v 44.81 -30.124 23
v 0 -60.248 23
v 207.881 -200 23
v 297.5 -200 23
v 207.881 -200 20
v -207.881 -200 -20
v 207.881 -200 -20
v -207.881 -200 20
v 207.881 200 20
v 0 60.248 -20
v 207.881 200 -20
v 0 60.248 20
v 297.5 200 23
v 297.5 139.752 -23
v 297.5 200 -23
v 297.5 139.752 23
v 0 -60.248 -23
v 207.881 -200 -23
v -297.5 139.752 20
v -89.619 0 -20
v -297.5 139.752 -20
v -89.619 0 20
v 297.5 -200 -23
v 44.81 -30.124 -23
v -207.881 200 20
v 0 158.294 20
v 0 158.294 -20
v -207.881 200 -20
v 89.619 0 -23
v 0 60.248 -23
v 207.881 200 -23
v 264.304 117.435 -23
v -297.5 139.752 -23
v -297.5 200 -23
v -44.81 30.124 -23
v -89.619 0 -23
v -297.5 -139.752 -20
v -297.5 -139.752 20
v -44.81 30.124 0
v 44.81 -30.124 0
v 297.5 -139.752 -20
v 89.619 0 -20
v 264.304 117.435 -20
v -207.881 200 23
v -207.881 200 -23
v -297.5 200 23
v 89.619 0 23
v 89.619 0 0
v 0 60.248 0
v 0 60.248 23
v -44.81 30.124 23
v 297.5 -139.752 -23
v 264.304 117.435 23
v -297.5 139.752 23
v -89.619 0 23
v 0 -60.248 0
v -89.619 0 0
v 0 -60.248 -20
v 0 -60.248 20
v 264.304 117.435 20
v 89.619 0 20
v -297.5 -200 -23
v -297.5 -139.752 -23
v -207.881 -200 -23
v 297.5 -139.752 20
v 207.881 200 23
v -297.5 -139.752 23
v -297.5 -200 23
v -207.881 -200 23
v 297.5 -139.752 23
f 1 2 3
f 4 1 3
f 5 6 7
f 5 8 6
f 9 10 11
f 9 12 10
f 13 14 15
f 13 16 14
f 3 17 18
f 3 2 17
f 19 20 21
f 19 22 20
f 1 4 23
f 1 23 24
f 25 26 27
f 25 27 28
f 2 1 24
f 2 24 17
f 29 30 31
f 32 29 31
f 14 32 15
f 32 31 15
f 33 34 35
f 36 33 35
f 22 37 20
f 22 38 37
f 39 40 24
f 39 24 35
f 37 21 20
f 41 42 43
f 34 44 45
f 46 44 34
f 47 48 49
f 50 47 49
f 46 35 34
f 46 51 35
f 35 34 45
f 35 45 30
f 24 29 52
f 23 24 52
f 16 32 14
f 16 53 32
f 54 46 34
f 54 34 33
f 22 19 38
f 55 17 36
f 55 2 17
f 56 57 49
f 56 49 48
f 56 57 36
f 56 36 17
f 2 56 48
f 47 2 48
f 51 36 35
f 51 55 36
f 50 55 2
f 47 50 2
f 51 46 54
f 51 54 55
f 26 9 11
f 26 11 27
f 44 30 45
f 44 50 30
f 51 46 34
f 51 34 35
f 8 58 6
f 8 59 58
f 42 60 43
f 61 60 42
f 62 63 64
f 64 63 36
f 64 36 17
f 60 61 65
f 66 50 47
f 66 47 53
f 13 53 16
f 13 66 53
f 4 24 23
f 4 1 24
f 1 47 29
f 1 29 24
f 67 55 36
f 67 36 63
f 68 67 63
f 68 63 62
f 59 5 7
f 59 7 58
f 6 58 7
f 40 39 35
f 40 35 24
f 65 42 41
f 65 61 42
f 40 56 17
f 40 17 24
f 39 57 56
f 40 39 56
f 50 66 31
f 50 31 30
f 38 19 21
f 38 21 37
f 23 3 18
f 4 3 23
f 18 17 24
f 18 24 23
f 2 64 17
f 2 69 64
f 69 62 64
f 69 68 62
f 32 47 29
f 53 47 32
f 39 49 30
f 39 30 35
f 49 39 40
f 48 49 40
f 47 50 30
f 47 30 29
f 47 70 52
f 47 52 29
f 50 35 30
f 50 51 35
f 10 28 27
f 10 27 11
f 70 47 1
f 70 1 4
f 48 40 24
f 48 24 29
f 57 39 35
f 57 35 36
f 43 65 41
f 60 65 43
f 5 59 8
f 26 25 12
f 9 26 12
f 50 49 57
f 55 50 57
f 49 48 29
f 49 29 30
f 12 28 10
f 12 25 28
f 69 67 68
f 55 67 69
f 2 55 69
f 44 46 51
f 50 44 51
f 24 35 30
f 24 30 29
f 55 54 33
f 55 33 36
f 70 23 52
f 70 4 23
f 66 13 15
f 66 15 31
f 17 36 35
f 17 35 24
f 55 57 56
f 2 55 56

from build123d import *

# Parameters (mm, degrees)
F1_DEPTH = 23
F2_DEPTH = 23
F3_DEPTH = 23
F4_DEPTH = 23
F5_DEPTH = 23
F6_DEPTH = 23
F7_DEPTH = 20


with BuildPart() as f1:
    # F0 (on Top) → F1 (new body, symmetric)
    with BuildSketch(Plane.XY):
        Polygon((207.8805789742, -200), (297.5, -200), (44.8097105129, -30.1241751347), (0, -60.2483502694), align=None)
    extrude(amount=F1_DEPTH, both=True)


with BuildPart() as f1b:
    # F0 (on Top) → F1, piece 2 (new body, symmetric)
    with BuildSketch(Plane.XY):
        Polygon((-44.8097105129, 30.1241751347), (-297.5, 200), (-297.5, 139.7516497306), (-89.6194210258, 0), align=None)
    extrude(amount=F1_DEPTH, both=True)


with BuildPart() as f2:
    # F0 (on Top) → F2 (new body)
    with BuildSketch(Plane.XY):
        Polygon((44.8097105129, -30.1241751347), (0, 0), (-44.8097105129, -30.1241751347), (0, -60.2483502694), align=None)
        Polygon((-44.8097105129, -30.1241751347), (0, 0), (-44.8097105129, 30.1241751347), (-89.6194210258, 0), align=None)
    extrude(amount=-F2_DEPTH)


with BuildPart() as f3:
    # F0 (on Top) → F3 (new body, symmetric)
    with BuildSketch(Plane.XY):
        Polygon((0, 60.2483502694), (-207.8805789742, 200), (-297.5, 200), (-44.8097105129, 30.1241751347), align=None)
    extrude(amount=F3_DEPTH, both=True)


with BuildPart() as f3b:
    # F0 (on Top) → F3, piece 2 (new body, symmetric)
    with BuildSketch(Plane.XY):
        Polygon((297.5, -200), (297.5, -139.7516497306), (89.6194210258, 0), (44.8097105129, -30.1241751347), align=None)
    extrude(amount=F3_DEPTH, both=True)


with BuildPart() as f4:
    # F0 (on Top) → F4 (new body)
    with BuildSketch(Plane.XY):
        Polygon((89.6194210258, 0), (44.8097105129, 30.1241751347), (0, 0), (44.8097105129, -30.1241751347), align=None)
        Polygon((0, 0), (44.8097105129, 30.1241751347), (0, 60.2483502694), (-44.8097105129, 30.1241751347), align=None)
    extrude(amount=-F4_DEPTH)


with BuildPart() as f5:
    # F0 (on Top) → F5 (new body, symmetric)
    with BuildSketch(Plane.XY):
        Polygon((0, -60.2483502694), (-44.8097105129, -30.1241751347), (-297.5, -200), (-207.8805789742, -200), align=None)
        Polygon((-297.5, -200), (-44.8097105129, -30.1241751347), (-89.6194210258, 0), (-297.5, -139.7516497306), align=None)
    extrude(amount=F5_DEPTH, both=True)


with BuildPart() as f5b:
    # F0 (on Top) → F5, piece 2 (new body, symmetric)
    with BuildSketch(Plane.XY):
        Polygon((297.5, 139.7516497306), (297.5, 200), (44.8097105129, 30.1241751347), (89.6194210258, 0), (264.3040703014, 117.4350583365), align=None)
        Polygon((44.8097105129, 30.1241751347), (297.5, 200), (207.8805789742, 200), (0, 60.2483502694), align=None)
    extrude(amount=F5_DEPTH, both=True)


with BuildPart() as f6:
    # F0 (on Top) → F6 (new body)
    with BuildSketch(Plane.XY):
        Polygon((89.6194210258, 0), (44.8097105129, 30.1241751347), (0, 0), (44.8097105129, -30.1241751347), align=None)
        Polygon((0, 0), (44.8097105129, 30.1241751347), (0, 60.2483502694), (-44.8097105129, 30.1241751347), align=None)
        Polygon((-44.8097105129, -30.1241751347), (0, 0), (-44.8097105129, 30.1241751347), (-89.6194210258, 0), align=None)
        Polygon((44.8097105129, -30.1241751347), (0, 0), (-44.8097105129, -30.1241751347), (0, -60.2483502694), align=None)
    extrude(amount=F6_DEPTH)


with BuildPart() as f7:
    # F0 (on Top) → F7 (new body, symmetric)
    with BuildSketch(Plane.XY):
        Polygon((-89.6194210258, 0), (-297.5, 139.7516497306), (-297.5, -139.7516497306), align=None)
    extrude(amount=F7_DEPTH, both=True)


with BuildPart() as f7b:
    # F0 (on Top) → F7, piece 2 (new body, symmetric)
    with BuildSketch(Plane.XY):
        Polygon((-207.8805789742, -200), (207.8805789742, -200), (0, -60.2483502694), align=None)
    extrude(amount=F7_DEPTH, both=True)


with BuildPart() as f7c:
    # F0 (on Top) → F7, piece 3 (new body, symmetric)
    with BuildSketch(Plane.XY):
        Polygon((89.6194210258, 0), (297.5, -139.7516497306), (264.3040703014, 117.4350583365), align=None)
    extrude(amount=F7_DEPTH, both=True)


with BuildPart() as f7d:
    # F0 (on Top) → F7, piece 4 (new body, symmetric)
    with BuildSketch(Plane.XY):
        Polygon((0, 60.2483502694), (207.8805789742, 200), (0, 158.2938283682), (-207.8805789742, 200), align=None)
    extrude(amount=F7_DEPTH, both=True)


solid = Compound([f1.part, f1b.part, f2.part, f3.part, f3b.part, f4.part, f5.part, f5b.part, f6.part, f7.part, f7b.part, f7c.part, f7d.part])
